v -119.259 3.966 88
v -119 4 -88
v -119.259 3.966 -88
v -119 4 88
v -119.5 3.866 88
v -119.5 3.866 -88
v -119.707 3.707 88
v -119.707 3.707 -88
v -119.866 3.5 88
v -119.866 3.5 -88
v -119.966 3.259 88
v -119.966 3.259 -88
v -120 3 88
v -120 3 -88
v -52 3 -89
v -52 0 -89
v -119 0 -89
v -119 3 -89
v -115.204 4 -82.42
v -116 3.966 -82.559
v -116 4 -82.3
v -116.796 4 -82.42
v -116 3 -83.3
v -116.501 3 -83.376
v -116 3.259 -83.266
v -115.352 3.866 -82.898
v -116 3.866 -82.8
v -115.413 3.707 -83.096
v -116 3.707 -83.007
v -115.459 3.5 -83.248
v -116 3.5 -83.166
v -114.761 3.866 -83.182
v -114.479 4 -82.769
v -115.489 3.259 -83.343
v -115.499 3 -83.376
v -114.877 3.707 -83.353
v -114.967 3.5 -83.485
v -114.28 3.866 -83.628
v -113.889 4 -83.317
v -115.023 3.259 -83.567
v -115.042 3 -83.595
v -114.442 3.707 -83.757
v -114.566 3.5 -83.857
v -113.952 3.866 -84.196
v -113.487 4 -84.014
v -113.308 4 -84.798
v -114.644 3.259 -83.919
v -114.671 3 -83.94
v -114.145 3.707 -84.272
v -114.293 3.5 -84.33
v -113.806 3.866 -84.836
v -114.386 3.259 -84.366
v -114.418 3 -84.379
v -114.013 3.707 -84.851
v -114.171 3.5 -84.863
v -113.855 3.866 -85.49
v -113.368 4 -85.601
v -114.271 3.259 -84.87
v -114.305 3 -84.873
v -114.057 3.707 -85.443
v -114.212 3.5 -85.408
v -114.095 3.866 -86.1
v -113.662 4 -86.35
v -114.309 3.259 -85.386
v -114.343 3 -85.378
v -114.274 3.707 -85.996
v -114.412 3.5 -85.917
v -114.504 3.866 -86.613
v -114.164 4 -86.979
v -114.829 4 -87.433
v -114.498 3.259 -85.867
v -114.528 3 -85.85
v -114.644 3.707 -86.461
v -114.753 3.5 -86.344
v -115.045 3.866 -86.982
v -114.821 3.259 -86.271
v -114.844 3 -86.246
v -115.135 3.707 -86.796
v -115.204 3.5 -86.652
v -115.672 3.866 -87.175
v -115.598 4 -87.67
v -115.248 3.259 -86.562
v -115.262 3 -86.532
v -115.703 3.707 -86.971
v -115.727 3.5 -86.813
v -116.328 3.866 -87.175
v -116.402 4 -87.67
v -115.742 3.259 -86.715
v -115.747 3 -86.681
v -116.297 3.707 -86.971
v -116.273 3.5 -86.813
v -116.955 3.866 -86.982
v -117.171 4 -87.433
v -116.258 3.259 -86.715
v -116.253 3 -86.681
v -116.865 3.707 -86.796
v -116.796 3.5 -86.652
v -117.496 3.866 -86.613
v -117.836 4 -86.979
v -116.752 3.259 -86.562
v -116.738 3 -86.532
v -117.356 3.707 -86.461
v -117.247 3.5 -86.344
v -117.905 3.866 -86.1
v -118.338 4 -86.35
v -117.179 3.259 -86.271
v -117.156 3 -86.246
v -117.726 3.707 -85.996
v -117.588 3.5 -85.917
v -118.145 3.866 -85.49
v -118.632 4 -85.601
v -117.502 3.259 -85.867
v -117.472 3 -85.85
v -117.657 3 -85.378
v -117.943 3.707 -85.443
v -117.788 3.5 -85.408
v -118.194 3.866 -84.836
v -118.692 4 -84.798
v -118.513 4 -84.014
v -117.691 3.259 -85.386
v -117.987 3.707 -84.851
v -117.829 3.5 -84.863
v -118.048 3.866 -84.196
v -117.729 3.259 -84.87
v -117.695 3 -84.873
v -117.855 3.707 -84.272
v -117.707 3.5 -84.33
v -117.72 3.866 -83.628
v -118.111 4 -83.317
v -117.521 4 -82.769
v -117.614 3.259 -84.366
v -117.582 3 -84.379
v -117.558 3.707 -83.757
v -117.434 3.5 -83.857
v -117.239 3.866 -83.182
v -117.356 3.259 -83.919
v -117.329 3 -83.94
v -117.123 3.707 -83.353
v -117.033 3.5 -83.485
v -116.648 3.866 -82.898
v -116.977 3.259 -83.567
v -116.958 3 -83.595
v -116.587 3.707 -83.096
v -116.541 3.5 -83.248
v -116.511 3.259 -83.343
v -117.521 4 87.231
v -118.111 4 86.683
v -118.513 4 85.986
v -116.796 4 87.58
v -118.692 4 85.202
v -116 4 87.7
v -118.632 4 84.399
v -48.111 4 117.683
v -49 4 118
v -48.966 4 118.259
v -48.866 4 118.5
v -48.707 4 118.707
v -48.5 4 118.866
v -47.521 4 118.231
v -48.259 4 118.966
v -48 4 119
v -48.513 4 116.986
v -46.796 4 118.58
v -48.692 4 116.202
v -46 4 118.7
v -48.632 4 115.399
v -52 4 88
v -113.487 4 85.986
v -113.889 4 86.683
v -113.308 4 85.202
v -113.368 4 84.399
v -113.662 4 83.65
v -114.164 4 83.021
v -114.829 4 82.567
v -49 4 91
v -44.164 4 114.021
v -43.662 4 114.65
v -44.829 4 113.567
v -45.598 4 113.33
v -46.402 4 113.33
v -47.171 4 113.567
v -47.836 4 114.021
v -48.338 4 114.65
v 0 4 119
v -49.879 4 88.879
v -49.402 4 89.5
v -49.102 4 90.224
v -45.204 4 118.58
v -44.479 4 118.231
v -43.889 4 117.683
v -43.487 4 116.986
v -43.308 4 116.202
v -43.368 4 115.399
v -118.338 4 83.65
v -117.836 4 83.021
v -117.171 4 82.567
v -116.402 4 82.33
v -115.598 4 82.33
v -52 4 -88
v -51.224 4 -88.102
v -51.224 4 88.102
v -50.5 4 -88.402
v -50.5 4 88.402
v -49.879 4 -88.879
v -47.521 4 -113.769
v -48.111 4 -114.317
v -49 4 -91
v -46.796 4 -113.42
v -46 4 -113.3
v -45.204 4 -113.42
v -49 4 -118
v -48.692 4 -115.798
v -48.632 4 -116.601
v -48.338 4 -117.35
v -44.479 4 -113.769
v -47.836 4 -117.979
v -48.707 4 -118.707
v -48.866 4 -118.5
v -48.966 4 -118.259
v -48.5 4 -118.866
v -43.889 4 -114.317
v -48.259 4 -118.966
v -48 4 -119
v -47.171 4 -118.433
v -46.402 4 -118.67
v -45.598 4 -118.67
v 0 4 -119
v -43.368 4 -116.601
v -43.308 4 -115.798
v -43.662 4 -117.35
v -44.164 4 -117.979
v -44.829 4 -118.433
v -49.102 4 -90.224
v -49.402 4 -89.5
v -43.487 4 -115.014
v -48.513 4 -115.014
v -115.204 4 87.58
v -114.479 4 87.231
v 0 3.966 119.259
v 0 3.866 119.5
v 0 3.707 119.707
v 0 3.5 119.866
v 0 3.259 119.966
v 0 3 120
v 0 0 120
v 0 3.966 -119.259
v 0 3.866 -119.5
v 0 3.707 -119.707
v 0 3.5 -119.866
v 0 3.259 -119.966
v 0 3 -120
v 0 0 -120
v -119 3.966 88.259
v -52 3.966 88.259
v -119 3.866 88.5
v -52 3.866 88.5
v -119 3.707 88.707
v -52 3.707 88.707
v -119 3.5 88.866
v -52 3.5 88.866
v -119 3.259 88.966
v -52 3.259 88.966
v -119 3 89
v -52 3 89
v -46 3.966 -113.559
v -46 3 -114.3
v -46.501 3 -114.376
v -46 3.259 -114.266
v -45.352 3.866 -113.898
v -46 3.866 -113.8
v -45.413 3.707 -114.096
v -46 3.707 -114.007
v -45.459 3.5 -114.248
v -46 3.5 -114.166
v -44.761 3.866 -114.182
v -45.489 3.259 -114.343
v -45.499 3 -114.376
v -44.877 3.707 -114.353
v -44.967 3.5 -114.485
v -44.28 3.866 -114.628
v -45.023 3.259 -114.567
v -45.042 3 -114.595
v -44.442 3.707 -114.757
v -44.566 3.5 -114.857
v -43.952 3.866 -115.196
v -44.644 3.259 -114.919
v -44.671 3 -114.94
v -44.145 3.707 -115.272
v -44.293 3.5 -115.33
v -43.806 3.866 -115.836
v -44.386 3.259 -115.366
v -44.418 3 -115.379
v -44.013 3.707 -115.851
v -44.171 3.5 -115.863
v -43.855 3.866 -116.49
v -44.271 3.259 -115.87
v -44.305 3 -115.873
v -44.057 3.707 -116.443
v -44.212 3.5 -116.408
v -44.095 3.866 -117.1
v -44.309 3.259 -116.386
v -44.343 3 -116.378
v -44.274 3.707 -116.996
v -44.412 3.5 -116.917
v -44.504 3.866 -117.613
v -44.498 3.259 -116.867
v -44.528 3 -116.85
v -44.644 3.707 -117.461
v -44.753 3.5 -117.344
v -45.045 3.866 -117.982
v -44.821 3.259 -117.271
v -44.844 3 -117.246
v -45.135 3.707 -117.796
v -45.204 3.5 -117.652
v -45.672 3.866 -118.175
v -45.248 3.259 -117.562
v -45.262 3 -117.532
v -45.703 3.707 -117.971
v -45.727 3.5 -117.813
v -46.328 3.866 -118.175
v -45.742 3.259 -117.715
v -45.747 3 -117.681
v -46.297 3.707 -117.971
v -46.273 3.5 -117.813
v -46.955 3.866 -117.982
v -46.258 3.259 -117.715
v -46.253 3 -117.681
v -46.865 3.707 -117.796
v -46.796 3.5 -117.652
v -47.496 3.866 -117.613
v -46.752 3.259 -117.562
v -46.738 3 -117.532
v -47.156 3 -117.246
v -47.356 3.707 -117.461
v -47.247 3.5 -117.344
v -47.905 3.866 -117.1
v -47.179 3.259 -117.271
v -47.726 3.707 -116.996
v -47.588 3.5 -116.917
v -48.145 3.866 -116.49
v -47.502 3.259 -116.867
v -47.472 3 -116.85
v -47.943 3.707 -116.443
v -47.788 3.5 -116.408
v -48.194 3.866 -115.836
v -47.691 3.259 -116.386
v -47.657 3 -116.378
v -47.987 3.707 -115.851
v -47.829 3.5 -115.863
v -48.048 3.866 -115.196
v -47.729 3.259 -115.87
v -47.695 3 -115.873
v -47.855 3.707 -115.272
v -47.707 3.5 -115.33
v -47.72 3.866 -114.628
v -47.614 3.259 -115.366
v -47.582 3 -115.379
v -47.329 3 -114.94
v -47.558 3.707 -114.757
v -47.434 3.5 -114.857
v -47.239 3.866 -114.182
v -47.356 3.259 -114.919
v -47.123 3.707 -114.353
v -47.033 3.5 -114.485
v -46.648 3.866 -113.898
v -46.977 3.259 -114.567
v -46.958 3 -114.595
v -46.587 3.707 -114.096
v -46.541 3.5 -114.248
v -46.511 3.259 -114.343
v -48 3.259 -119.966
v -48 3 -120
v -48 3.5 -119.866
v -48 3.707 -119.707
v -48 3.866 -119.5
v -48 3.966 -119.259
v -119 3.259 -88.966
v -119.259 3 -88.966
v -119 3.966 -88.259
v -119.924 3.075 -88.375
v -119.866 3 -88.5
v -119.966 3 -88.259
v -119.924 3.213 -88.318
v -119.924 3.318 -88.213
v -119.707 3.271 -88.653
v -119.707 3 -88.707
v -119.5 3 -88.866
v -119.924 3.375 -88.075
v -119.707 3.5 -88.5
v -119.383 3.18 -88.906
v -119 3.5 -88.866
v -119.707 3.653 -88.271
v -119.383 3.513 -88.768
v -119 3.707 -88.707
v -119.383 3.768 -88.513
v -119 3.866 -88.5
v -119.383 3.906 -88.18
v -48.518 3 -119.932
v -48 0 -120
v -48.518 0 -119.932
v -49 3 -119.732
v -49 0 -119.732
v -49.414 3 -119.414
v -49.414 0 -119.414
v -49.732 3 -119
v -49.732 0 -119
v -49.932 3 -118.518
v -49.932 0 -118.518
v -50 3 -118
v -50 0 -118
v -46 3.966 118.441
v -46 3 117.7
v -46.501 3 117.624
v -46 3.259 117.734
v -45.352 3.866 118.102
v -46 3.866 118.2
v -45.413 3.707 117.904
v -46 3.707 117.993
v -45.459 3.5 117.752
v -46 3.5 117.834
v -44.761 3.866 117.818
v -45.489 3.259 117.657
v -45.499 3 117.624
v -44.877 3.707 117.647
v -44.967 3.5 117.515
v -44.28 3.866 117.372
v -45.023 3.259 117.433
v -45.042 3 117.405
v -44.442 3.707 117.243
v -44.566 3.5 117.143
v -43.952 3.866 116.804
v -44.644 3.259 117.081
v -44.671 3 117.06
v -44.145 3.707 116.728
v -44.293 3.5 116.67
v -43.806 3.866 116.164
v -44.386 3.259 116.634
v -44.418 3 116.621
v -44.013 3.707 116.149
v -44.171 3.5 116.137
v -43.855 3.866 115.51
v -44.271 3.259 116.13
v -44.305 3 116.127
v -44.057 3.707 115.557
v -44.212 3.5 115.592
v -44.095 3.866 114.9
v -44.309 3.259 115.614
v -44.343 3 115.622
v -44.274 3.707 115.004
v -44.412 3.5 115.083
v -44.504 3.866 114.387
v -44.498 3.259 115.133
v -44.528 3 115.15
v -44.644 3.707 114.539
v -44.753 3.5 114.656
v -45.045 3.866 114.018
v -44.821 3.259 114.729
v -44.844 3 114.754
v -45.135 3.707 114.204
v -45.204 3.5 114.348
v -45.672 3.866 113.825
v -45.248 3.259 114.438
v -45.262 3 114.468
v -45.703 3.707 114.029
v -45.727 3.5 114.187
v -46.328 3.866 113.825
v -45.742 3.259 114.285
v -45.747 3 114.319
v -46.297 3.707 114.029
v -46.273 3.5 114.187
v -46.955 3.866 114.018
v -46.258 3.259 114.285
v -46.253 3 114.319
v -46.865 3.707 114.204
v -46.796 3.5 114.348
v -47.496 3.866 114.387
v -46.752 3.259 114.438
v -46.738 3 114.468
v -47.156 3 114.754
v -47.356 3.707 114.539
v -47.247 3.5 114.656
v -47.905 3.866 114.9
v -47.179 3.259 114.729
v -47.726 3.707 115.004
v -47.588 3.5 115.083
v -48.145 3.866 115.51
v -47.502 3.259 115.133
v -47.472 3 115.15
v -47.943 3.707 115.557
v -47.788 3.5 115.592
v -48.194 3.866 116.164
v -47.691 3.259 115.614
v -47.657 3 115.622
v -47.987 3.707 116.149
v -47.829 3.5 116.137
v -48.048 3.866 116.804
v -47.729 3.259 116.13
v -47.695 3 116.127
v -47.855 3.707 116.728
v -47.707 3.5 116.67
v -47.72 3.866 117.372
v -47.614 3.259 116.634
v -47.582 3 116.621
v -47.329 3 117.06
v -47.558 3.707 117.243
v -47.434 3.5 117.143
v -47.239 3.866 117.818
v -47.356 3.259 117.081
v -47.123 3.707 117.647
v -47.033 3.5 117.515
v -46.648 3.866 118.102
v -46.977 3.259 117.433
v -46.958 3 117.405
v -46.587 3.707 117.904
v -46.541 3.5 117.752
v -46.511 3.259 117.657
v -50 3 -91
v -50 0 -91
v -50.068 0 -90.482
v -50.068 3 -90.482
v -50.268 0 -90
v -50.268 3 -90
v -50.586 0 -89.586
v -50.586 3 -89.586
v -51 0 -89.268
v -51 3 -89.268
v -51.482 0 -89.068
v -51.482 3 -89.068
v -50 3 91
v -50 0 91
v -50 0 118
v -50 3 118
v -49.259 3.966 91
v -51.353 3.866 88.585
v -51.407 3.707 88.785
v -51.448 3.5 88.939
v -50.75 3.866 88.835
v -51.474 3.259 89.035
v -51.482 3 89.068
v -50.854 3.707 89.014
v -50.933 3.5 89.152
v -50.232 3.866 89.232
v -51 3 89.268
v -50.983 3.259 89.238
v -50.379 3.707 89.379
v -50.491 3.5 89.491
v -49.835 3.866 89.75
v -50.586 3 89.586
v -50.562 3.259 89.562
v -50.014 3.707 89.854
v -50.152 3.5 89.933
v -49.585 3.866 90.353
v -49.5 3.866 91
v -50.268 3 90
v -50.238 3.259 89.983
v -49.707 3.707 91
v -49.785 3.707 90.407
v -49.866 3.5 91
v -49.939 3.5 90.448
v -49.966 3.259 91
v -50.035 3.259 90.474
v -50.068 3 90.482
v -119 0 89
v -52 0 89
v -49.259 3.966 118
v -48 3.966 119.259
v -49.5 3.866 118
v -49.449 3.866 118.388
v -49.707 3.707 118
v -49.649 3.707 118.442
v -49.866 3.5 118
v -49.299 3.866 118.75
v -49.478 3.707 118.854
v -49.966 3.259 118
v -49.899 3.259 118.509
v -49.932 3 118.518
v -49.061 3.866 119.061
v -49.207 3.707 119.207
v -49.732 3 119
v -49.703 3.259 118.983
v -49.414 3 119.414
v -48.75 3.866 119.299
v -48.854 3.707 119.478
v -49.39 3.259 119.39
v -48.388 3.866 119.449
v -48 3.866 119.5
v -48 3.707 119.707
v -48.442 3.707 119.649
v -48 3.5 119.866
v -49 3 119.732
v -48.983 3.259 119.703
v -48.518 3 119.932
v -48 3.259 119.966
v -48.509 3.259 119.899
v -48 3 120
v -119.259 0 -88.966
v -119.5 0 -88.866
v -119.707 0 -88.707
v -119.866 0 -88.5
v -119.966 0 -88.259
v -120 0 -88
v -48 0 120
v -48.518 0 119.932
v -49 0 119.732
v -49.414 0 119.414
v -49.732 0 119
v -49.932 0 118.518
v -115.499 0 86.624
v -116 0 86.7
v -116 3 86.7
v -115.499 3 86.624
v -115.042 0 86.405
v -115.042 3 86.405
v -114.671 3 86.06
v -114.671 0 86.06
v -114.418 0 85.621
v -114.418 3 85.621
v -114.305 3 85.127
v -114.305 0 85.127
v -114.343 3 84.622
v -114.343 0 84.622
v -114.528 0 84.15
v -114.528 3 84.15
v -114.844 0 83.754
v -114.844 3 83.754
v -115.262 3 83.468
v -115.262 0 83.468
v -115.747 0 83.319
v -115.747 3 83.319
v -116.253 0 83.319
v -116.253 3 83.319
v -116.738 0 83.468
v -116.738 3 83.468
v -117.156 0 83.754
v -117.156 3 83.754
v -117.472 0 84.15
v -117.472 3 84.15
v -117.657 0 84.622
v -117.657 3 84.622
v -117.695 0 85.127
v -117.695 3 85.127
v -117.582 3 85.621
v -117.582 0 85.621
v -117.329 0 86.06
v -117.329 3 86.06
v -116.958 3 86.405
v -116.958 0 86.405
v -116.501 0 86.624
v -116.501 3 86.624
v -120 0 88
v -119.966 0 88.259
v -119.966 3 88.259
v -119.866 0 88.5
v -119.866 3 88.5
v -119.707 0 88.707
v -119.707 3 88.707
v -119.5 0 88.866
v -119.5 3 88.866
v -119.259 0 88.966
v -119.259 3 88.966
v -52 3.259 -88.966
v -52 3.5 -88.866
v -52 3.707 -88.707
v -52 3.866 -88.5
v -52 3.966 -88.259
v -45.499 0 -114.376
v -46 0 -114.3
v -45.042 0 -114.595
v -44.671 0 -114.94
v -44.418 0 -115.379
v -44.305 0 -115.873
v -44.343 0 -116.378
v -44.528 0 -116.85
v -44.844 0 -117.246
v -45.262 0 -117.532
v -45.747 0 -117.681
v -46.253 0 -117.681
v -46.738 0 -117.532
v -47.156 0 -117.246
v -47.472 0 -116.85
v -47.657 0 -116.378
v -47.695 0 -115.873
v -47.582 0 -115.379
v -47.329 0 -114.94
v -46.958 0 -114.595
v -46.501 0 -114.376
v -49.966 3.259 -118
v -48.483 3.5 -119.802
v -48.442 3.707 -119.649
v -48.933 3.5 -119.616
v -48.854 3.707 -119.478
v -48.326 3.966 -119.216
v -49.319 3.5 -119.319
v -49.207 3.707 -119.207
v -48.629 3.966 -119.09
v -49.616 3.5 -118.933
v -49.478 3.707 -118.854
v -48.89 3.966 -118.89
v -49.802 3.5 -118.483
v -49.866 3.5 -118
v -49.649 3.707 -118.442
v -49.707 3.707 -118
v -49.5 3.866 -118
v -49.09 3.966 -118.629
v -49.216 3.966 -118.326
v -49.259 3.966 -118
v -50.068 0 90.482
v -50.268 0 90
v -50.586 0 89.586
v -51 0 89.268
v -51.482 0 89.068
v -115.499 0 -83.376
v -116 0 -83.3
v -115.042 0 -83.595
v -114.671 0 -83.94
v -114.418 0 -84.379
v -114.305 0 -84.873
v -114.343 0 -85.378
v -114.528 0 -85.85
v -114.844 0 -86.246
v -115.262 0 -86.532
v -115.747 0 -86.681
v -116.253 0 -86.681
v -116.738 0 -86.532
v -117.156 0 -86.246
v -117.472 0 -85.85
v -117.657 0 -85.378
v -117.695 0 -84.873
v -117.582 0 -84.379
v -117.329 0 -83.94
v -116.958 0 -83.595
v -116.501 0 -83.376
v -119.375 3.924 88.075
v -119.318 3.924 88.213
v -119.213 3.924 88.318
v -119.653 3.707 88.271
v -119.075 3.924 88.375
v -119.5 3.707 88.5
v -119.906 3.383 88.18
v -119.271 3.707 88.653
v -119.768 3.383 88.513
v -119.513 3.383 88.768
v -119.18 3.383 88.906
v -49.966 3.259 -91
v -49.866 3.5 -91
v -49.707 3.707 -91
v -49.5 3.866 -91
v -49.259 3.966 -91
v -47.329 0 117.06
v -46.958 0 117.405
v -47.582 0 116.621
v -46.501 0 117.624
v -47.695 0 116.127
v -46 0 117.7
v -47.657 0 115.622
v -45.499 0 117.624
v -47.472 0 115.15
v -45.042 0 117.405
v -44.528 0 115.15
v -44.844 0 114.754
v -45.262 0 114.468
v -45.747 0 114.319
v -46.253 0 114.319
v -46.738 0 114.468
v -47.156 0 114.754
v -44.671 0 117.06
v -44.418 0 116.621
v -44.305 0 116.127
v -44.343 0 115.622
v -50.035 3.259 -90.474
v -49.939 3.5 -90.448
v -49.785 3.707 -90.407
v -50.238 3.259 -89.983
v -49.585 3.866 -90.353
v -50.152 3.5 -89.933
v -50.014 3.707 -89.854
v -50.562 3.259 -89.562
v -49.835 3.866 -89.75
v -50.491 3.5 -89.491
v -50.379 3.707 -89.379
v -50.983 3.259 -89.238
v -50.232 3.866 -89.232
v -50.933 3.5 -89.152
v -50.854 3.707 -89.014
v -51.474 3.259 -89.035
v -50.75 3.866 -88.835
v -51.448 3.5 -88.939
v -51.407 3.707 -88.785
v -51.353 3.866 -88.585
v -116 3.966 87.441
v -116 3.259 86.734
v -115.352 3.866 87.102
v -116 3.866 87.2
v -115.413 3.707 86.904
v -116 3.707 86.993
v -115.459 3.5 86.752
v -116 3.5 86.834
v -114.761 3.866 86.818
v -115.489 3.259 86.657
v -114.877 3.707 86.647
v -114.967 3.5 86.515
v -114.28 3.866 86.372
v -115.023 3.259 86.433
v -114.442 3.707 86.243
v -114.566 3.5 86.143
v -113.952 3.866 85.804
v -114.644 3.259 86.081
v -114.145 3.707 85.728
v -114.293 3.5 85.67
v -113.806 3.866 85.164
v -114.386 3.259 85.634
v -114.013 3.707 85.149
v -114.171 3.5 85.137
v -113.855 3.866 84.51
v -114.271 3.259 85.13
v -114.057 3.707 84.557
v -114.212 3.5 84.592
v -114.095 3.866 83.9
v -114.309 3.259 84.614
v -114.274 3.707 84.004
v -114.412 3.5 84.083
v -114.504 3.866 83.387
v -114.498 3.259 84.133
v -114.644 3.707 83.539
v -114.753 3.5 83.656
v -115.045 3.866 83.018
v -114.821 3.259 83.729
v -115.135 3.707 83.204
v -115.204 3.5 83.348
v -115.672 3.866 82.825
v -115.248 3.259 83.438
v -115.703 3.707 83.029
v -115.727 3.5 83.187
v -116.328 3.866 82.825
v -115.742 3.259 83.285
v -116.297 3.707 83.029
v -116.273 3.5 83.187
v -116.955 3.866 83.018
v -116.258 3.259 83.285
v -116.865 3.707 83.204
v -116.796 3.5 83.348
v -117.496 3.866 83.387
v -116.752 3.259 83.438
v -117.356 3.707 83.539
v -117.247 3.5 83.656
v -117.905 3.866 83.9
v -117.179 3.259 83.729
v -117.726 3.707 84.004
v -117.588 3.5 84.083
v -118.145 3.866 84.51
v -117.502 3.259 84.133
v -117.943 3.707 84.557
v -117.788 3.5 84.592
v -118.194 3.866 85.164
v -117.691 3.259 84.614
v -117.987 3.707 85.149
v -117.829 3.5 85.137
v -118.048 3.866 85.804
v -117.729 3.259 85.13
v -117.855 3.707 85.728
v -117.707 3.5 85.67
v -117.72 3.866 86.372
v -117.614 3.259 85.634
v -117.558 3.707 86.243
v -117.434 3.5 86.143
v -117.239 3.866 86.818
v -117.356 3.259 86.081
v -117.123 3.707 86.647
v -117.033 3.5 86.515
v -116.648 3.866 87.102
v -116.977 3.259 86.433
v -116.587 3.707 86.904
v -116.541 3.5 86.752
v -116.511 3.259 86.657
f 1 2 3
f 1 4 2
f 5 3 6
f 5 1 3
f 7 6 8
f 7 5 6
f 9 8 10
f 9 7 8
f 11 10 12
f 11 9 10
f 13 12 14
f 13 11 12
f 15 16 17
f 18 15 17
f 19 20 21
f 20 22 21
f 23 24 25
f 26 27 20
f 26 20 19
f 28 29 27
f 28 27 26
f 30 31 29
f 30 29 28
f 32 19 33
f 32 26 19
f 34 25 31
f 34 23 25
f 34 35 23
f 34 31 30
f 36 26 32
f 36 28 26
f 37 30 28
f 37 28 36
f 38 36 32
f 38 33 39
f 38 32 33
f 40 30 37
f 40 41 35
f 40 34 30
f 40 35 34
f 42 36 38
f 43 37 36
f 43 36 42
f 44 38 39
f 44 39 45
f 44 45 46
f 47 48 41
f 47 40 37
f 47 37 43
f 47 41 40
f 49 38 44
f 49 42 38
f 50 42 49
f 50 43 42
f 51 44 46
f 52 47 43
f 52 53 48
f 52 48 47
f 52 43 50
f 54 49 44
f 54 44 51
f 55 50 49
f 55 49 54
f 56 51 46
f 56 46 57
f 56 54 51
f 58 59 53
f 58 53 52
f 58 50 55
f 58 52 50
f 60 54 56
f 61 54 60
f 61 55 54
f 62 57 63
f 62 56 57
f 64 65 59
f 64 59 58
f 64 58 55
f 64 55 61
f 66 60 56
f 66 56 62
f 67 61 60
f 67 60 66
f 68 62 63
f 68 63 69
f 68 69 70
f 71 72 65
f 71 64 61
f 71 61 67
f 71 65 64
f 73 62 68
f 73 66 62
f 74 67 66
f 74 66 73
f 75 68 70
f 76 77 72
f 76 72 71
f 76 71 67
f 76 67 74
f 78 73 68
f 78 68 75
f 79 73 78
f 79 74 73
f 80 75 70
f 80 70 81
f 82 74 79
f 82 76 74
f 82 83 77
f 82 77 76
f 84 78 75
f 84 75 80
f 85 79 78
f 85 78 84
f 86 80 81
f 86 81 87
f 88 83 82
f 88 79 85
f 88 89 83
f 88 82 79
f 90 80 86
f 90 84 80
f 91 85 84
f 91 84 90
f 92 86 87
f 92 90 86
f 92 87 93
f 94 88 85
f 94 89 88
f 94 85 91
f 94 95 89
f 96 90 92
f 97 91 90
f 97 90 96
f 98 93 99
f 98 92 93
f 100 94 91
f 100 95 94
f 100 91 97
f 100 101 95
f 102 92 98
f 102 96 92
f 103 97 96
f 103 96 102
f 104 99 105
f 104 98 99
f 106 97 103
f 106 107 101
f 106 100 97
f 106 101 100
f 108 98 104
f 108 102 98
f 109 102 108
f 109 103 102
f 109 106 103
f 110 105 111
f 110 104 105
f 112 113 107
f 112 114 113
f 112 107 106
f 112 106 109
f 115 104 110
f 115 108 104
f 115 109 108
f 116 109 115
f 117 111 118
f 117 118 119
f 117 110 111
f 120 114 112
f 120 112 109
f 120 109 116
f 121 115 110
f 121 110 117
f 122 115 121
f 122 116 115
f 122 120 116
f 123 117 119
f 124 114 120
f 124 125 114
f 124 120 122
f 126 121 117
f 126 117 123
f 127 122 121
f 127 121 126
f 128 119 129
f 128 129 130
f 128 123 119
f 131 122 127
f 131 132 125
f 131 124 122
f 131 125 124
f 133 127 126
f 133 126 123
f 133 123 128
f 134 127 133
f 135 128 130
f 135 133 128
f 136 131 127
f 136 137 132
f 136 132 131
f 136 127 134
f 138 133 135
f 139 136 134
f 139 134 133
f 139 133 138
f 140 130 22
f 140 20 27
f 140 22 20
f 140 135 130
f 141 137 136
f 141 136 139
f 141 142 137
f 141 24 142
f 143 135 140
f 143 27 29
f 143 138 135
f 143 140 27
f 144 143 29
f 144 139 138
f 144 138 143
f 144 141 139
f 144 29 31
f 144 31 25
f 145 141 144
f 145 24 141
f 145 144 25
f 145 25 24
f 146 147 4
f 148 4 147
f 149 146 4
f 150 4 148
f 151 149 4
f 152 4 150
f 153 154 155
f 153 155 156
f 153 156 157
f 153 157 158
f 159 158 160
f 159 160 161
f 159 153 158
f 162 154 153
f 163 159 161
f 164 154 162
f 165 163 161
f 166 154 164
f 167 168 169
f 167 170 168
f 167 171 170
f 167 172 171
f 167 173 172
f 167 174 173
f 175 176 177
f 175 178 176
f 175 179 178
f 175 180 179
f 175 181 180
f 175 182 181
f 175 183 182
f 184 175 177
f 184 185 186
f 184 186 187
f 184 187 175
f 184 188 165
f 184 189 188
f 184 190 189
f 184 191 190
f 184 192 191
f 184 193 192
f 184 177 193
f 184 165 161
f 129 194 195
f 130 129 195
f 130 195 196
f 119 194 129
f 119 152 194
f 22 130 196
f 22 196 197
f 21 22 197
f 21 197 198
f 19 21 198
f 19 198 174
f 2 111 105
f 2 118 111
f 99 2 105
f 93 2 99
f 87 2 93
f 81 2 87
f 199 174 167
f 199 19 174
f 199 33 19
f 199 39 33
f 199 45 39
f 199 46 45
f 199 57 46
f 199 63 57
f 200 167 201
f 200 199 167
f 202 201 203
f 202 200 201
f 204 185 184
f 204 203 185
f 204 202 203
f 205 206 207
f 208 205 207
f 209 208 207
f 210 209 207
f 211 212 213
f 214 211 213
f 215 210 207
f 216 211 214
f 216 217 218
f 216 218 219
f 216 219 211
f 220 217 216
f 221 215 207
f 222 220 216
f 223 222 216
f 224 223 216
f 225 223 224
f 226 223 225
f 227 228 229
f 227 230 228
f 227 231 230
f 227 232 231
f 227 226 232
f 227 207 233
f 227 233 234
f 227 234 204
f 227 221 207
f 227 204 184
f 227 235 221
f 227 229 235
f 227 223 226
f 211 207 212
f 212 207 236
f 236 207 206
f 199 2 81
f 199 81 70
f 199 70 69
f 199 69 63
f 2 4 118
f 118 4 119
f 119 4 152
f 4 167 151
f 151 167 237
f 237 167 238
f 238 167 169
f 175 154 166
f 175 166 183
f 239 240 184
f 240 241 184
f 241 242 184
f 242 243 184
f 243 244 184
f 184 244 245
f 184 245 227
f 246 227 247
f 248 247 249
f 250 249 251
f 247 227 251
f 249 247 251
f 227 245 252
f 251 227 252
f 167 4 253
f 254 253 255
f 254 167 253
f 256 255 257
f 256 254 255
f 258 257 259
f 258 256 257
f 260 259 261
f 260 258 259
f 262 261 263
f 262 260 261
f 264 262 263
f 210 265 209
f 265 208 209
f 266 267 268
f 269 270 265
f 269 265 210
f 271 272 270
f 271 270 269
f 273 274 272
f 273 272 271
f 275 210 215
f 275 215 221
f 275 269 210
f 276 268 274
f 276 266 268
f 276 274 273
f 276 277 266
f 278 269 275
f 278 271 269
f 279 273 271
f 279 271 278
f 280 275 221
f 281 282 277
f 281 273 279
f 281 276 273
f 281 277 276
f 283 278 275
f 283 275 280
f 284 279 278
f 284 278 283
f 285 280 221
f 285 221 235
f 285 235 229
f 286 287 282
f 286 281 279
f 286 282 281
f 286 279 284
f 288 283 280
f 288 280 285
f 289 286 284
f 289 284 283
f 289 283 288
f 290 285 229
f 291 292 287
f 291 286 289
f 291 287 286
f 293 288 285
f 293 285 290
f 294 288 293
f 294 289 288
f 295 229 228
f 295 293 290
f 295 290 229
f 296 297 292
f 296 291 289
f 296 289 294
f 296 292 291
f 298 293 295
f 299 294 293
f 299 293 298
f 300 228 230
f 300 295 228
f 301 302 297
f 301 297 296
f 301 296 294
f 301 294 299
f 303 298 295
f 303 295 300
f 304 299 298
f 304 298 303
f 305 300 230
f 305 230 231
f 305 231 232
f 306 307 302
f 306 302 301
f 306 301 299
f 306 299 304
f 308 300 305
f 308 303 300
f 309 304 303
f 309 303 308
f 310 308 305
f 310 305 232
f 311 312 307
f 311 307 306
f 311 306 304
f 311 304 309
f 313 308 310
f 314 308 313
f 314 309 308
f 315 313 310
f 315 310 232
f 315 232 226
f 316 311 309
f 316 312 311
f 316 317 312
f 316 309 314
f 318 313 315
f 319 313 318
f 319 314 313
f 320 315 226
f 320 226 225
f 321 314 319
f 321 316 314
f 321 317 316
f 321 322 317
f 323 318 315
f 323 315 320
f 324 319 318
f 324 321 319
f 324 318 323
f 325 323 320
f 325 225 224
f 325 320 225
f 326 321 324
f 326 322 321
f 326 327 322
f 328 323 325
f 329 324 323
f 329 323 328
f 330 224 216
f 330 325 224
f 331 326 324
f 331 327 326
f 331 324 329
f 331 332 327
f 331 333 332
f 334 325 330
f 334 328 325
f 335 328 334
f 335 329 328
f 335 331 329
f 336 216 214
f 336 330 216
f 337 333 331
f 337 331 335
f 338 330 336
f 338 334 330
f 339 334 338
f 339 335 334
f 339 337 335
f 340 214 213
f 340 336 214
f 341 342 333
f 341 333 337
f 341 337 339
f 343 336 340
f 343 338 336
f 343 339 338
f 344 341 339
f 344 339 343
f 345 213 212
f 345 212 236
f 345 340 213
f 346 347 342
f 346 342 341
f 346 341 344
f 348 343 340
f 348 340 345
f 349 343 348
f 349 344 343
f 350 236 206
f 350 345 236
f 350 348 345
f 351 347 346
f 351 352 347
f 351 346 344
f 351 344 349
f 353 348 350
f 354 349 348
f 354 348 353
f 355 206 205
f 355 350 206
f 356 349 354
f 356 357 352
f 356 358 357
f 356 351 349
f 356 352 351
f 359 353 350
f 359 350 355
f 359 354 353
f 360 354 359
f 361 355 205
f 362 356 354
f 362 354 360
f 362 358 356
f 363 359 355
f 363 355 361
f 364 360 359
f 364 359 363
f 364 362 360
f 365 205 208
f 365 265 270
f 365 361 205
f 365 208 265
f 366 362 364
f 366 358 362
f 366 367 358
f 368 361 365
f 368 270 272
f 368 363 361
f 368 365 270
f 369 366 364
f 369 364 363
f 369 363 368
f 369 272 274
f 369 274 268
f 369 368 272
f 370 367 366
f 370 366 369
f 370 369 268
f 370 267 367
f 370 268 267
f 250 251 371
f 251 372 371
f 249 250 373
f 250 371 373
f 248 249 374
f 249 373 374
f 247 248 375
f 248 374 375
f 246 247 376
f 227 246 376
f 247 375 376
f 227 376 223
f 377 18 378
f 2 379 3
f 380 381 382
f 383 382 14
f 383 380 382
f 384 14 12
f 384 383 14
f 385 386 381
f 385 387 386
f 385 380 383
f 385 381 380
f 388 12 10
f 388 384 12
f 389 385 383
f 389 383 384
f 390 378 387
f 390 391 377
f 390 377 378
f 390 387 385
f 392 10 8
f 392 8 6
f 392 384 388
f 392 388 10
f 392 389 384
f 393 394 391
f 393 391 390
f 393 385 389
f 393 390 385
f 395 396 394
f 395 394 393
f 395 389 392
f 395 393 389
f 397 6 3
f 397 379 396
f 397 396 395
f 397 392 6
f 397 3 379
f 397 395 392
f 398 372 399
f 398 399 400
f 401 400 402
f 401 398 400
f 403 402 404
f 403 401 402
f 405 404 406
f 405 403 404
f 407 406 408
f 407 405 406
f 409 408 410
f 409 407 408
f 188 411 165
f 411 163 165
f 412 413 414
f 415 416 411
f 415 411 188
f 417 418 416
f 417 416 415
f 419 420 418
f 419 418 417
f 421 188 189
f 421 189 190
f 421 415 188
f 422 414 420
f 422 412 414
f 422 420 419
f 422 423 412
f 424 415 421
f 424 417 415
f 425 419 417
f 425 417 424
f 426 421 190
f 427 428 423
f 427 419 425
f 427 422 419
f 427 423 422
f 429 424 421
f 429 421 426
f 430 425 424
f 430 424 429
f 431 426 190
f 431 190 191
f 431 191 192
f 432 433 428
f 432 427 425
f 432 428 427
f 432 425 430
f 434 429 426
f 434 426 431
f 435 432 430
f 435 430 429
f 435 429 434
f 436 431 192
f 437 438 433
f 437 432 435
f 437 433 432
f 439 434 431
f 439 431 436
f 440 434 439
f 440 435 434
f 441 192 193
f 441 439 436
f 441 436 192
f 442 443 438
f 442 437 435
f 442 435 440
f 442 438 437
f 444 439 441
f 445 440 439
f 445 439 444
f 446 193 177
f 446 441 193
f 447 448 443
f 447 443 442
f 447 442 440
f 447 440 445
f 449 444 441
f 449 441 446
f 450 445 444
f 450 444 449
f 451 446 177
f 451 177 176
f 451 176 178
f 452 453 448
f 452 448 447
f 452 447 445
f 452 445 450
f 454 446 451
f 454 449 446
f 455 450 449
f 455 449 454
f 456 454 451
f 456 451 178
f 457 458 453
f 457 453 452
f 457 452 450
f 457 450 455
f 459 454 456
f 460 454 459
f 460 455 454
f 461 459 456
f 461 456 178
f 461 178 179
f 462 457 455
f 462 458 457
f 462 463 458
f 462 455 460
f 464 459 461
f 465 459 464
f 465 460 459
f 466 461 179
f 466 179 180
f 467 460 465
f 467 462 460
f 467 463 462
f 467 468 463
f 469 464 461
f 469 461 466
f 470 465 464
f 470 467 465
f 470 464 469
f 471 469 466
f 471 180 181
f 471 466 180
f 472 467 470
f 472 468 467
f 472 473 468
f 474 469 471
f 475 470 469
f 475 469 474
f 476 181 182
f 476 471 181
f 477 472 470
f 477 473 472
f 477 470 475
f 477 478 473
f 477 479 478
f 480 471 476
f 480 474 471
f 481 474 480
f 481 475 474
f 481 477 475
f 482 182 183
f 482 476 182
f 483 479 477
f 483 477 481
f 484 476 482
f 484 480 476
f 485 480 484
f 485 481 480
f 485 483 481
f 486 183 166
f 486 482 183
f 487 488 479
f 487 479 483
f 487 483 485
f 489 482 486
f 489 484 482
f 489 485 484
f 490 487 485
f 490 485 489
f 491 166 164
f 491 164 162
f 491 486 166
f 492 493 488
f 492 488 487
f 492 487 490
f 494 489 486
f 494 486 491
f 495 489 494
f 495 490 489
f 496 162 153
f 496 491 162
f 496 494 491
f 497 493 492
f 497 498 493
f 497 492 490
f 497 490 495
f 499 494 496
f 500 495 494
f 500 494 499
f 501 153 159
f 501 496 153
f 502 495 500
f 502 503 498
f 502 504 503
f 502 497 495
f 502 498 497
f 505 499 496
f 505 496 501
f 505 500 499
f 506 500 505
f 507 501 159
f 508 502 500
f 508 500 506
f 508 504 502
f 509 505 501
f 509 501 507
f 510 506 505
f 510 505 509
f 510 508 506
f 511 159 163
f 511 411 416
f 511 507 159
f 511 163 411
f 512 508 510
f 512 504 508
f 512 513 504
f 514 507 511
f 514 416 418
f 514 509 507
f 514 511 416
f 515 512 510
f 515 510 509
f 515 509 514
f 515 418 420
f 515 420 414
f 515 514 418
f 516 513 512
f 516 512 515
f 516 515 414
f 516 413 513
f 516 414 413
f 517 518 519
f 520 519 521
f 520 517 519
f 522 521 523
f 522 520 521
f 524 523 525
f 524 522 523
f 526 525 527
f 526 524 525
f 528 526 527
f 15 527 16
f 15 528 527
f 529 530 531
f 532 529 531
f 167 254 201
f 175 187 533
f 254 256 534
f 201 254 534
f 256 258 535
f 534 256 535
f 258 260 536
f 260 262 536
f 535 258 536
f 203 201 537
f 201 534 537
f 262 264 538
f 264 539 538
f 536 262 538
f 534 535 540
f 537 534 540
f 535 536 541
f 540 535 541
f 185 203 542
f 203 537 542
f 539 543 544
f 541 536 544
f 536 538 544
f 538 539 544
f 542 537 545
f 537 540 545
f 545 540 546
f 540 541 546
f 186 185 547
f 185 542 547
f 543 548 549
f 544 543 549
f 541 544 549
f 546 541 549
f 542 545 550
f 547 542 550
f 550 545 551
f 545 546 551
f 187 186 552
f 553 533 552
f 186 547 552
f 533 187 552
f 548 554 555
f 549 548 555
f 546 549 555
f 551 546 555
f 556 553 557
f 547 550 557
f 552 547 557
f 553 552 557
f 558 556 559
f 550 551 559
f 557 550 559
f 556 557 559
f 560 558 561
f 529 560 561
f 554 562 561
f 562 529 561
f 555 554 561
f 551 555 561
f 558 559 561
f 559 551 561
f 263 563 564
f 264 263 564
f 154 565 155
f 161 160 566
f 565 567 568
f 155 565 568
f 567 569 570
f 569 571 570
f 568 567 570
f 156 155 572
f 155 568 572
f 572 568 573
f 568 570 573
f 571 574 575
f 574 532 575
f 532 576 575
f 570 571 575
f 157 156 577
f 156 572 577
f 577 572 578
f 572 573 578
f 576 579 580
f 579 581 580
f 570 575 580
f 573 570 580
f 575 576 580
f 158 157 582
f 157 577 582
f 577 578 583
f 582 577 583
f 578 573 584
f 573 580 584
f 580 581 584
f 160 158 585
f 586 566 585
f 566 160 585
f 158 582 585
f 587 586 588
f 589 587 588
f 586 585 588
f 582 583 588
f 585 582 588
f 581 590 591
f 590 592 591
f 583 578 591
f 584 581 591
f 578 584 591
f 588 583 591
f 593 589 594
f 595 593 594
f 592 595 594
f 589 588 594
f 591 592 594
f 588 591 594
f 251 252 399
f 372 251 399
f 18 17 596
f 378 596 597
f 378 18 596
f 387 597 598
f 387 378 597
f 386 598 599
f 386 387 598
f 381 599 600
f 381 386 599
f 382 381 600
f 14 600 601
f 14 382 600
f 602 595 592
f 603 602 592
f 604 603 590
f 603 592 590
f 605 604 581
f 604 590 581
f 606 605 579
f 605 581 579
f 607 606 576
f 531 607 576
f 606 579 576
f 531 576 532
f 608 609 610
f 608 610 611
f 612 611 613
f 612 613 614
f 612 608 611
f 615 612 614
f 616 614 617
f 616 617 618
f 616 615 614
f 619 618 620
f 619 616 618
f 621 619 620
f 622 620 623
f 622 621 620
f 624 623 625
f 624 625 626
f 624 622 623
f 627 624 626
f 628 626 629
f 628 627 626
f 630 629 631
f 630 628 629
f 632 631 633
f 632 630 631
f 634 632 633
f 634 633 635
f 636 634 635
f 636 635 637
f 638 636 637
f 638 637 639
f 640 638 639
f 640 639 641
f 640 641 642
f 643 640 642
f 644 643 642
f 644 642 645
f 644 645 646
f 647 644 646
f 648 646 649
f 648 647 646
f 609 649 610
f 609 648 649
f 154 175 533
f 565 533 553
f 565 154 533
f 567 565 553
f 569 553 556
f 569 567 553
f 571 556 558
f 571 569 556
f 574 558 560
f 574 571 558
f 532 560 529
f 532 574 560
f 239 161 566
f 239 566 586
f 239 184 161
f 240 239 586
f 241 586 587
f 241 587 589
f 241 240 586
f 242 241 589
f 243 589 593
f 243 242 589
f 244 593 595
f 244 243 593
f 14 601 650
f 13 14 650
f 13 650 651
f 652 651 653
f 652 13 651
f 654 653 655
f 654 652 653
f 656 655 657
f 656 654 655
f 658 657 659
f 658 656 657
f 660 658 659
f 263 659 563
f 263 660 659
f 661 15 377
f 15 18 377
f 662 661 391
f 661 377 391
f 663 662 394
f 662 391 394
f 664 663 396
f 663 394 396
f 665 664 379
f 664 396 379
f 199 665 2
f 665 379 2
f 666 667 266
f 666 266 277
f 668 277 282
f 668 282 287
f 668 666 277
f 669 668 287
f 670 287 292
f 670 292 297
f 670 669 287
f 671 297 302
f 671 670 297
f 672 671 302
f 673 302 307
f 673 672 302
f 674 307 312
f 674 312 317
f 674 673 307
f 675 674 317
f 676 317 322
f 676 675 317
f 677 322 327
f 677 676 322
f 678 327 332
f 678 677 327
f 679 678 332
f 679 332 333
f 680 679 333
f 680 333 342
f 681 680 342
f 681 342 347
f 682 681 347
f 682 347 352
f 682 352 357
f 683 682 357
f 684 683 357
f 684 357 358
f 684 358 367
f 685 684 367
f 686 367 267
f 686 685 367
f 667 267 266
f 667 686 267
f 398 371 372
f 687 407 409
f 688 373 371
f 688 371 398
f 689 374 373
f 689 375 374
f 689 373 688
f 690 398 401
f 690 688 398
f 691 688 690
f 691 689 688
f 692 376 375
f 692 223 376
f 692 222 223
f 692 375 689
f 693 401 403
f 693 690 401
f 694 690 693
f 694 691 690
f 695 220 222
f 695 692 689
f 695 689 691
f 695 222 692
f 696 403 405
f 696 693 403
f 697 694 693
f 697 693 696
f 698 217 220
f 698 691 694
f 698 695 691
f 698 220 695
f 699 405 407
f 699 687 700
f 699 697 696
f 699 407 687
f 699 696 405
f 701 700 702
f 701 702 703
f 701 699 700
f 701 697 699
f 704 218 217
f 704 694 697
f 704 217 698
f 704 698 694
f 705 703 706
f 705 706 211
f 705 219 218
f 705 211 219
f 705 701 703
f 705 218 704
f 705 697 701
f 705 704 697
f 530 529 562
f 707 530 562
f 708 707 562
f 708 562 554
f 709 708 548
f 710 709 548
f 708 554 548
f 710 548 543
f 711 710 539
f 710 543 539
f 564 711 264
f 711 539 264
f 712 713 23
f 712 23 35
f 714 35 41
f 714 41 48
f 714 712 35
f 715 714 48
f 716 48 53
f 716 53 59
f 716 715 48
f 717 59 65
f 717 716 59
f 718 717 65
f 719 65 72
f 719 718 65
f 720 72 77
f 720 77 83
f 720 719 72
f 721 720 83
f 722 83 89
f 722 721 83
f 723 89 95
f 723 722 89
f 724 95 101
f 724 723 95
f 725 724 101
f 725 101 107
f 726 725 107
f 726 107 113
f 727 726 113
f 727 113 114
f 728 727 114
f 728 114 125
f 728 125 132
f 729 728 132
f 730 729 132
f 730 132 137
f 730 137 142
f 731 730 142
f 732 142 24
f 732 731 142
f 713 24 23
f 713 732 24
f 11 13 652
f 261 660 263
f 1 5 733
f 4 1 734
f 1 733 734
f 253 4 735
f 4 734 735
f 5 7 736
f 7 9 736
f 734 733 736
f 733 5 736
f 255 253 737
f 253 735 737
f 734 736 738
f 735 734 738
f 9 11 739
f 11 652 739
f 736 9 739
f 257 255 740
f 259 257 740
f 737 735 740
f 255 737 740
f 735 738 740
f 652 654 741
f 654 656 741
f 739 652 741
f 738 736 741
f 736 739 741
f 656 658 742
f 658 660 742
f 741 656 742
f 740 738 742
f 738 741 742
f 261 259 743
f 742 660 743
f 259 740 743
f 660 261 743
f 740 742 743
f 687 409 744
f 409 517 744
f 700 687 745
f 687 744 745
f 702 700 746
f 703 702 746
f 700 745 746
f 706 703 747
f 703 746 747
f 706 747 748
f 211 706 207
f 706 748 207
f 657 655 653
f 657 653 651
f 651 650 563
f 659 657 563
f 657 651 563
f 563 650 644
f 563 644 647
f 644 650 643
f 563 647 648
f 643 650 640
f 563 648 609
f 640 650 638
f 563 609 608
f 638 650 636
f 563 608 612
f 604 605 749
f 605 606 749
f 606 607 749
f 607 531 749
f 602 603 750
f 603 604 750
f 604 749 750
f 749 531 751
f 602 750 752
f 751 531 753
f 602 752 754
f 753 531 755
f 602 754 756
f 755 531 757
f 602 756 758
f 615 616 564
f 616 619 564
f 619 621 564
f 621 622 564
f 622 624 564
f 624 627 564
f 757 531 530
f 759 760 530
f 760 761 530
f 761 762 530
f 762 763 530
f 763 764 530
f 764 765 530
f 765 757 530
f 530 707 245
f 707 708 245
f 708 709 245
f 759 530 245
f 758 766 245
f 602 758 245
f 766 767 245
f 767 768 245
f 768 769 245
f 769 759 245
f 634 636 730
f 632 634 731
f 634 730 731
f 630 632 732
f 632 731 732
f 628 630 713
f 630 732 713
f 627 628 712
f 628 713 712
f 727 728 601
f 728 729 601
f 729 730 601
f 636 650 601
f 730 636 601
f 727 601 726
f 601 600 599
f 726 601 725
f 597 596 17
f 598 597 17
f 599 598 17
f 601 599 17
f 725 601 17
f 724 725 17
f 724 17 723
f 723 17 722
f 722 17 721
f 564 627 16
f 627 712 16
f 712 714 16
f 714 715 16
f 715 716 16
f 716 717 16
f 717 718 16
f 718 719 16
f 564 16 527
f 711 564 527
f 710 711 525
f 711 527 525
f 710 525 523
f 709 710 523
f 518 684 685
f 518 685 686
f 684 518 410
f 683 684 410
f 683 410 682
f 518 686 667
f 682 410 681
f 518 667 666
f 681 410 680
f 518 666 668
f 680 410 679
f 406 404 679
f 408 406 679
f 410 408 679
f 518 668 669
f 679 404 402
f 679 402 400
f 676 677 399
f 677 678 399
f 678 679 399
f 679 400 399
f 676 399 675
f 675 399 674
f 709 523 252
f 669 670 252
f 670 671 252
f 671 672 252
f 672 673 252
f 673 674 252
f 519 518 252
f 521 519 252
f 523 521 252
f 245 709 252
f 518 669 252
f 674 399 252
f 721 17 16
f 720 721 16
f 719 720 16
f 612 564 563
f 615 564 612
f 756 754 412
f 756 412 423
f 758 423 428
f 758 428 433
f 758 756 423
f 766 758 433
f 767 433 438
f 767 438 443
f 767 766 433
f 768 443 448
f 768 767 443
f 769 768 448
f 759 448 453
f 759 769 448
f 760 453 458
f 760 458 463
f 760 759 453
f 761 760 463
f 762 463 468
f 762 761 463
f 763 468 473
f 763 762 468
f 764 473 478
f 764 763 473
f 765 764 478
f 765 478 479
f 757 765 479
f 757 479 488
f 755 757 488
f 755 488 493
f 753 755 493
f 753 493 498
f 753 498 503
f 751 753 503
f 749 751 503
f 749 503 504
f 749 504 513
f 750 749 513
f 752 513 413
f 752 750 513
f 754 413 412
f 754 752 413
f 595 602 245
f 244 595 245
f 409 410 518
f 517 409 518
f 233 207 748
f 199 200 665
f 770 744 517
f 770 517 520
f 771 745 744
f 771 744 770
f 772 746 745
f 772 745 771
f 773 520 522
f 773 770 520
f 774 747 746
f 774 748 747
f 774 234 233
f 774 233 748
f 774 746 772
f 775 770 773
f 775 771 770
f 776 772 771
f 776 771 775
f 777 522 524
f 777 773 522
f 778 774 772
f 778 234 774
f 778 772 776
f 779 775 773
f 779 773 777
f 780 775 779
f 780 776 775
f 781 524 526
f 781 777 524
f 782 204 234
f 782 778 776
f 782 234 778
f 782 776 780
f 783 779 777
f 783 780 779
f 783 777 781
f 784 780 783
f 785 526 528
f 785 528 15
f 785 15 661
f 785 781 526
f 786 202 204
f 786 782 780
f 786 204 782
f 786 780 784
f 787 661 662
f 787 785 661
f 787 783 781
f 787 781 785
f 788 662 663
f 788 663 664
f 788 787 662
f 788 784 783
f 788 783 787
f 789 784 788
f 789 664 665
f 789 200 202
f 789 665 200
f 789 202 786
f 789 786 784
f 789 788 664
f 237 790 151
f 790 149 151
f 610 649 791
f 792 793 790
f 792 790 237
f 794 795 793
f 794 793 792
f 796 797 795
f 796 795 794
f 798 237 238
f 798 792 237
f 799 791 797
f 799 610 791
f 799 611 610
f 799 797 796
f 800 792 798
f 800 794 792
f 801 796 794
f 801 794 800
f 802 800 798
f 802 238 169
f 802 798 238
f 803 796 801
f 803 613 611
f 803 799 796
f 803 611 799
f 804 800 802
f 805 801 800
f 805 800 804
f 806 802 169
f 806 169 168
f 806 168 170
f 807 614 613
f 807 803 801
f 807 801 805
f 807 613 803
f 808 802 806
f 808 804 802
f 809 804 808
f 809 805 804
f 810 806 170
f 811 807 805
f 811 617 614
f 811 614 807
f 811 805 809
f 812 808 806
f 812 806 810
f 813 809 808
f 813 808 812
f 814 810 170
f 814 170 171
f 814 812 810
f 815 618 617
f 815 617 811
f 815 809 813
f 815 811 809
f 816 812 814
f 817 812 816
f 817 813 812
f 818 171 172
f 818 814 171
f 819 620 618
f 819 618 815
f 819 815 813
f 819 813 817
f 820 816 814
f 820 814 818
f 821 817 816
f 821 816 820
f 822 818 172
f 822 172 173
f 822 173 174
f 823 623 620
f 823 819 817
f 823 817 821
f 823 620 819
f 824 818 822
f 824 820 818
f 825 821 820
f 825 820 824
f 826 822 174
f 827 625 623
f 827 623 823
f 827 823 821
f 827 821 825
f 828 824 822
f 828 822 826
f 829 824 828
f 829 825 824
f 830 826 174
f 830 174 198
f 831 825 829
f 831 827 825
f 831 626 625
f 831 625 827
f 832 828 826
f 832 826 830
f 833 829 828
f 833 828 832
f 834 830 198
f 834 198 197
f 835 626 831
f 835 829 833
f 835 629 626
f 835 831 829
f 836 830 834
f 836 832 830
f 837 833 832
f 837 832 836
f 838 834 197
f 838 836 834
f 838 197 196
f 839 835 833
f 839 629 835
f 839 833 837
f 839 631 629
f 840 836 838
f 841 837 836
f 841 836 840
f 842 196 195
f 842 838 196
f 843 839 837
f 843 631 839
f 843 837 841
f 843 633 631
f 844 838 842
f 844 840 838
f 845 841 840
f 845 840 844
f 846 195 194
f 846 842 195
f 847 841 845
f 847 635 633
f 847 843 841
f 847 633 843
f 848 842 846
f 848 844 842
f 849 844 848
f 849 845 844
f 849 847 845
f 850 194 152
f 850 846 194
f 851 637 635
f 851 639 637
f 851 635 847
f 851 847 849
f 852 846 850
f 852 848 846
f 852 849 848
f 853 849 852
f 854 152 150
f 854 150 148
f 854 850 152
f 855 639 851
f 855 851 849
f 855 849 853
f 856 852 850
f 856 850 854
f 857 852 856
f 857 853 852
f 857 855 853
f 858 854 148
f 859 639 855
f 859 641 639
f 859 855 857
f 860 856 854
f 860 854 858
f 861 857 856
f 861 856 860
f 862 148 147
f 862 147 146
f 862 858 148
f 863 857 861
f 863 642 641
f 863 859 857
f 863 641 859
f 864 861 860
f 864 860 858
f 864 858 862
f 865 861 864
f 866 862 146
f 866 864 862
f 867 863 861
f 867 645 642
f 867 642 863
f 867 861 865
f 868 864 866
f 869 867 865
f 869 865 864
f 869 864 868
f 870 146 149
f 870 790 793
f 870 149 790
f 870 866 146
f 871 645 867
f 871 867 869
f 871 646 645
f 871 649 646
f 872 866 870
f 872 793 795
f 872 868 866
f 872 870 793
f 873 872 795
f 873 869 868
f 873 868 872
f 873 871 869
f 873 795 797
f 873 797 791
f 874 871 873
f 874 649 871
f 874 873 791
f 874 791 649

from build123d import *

# Parameters (mm, degrees)
SKETCH1_R           = 1.7
BOSS_EXTRUDE1_DEPTH = 4
FILLET1_R           = 2
FILLET2_R           = 1


with BuildPart() as part:
    # Sketch1 → Boss-Extrude1 (new body)
    with BuildSketch(Plane(origin=(0, 0, 0), x_dir=(1, 0, 0), z_dir=(0, 1, 0))):
        Polygon((0, 0), (0, 120), (-50, 120), (-50, 89), (-120, 89), (-120, 0), (-120, -89), (-50, -89), (-50, -120), (0, -120), align=None)
        with Locations(Location((-46, -116, 0), (0, 0, 270))):
            Circle(SKETCH1_R, mode=Mode.SUBTRACT)
        with Locations(Location((-116, -85, 0), (0, 0, 270))):
            Circle(SKETCH1_R, mode=Mode.SUBTRACT)
        with Locations(Location((-116, 85, 0), (0, 0, 270))):
            Circle(SKETCH1_R, mode=Mode.SUBTRACT)
        with Locations(Location((-46, 116, 0), (0, 0, 270))):
            Circle(SKETCH1_R, mode=Mode.SUBTRACT)
    extrude(amount=BOSS_EXTRUDE1_DEPTH)

    # Fillet1
    fillet1_edges = [part.edges().sort_by_distance(p)[0] for p in [
        (-50, 2, 120),
        (-50, 2, 89),
        (-50, 2, -89),
        (-50, 2, -120),
    ]]
    fillet(fillet1_edges, radius=FILLET1_R)

    # Fillet2
    fillet2_edges = [part.edges().sort_by_distance(p)[0] for p in [
        (-24, 4, -120),
        (-120, 2, 89),
        (-120, 2, -89),
        (-120, 4, 0),
        (-46, 4, 114.3),
        (-116, 4, 83.3),
        (-86, 4, 89),
        (-116, 4, -86.7),
        (-46, 4, -117.7),
        (-86, 4, -89),
        (-50, 4, -104.5),
        (-50, 4, 104.5),
        (-24, 4, 120),
        (-49.414213562, 4, 119.414213562),
        (-49.414213562, 4, -119.414213562),
        (-50.585786438, 4, -89.585786438),
        (-50.585786438, 4, 89.585786438),
    ]]
    fillet(fillet2_edges, radius=FILLET2_R)


solid = part.part
